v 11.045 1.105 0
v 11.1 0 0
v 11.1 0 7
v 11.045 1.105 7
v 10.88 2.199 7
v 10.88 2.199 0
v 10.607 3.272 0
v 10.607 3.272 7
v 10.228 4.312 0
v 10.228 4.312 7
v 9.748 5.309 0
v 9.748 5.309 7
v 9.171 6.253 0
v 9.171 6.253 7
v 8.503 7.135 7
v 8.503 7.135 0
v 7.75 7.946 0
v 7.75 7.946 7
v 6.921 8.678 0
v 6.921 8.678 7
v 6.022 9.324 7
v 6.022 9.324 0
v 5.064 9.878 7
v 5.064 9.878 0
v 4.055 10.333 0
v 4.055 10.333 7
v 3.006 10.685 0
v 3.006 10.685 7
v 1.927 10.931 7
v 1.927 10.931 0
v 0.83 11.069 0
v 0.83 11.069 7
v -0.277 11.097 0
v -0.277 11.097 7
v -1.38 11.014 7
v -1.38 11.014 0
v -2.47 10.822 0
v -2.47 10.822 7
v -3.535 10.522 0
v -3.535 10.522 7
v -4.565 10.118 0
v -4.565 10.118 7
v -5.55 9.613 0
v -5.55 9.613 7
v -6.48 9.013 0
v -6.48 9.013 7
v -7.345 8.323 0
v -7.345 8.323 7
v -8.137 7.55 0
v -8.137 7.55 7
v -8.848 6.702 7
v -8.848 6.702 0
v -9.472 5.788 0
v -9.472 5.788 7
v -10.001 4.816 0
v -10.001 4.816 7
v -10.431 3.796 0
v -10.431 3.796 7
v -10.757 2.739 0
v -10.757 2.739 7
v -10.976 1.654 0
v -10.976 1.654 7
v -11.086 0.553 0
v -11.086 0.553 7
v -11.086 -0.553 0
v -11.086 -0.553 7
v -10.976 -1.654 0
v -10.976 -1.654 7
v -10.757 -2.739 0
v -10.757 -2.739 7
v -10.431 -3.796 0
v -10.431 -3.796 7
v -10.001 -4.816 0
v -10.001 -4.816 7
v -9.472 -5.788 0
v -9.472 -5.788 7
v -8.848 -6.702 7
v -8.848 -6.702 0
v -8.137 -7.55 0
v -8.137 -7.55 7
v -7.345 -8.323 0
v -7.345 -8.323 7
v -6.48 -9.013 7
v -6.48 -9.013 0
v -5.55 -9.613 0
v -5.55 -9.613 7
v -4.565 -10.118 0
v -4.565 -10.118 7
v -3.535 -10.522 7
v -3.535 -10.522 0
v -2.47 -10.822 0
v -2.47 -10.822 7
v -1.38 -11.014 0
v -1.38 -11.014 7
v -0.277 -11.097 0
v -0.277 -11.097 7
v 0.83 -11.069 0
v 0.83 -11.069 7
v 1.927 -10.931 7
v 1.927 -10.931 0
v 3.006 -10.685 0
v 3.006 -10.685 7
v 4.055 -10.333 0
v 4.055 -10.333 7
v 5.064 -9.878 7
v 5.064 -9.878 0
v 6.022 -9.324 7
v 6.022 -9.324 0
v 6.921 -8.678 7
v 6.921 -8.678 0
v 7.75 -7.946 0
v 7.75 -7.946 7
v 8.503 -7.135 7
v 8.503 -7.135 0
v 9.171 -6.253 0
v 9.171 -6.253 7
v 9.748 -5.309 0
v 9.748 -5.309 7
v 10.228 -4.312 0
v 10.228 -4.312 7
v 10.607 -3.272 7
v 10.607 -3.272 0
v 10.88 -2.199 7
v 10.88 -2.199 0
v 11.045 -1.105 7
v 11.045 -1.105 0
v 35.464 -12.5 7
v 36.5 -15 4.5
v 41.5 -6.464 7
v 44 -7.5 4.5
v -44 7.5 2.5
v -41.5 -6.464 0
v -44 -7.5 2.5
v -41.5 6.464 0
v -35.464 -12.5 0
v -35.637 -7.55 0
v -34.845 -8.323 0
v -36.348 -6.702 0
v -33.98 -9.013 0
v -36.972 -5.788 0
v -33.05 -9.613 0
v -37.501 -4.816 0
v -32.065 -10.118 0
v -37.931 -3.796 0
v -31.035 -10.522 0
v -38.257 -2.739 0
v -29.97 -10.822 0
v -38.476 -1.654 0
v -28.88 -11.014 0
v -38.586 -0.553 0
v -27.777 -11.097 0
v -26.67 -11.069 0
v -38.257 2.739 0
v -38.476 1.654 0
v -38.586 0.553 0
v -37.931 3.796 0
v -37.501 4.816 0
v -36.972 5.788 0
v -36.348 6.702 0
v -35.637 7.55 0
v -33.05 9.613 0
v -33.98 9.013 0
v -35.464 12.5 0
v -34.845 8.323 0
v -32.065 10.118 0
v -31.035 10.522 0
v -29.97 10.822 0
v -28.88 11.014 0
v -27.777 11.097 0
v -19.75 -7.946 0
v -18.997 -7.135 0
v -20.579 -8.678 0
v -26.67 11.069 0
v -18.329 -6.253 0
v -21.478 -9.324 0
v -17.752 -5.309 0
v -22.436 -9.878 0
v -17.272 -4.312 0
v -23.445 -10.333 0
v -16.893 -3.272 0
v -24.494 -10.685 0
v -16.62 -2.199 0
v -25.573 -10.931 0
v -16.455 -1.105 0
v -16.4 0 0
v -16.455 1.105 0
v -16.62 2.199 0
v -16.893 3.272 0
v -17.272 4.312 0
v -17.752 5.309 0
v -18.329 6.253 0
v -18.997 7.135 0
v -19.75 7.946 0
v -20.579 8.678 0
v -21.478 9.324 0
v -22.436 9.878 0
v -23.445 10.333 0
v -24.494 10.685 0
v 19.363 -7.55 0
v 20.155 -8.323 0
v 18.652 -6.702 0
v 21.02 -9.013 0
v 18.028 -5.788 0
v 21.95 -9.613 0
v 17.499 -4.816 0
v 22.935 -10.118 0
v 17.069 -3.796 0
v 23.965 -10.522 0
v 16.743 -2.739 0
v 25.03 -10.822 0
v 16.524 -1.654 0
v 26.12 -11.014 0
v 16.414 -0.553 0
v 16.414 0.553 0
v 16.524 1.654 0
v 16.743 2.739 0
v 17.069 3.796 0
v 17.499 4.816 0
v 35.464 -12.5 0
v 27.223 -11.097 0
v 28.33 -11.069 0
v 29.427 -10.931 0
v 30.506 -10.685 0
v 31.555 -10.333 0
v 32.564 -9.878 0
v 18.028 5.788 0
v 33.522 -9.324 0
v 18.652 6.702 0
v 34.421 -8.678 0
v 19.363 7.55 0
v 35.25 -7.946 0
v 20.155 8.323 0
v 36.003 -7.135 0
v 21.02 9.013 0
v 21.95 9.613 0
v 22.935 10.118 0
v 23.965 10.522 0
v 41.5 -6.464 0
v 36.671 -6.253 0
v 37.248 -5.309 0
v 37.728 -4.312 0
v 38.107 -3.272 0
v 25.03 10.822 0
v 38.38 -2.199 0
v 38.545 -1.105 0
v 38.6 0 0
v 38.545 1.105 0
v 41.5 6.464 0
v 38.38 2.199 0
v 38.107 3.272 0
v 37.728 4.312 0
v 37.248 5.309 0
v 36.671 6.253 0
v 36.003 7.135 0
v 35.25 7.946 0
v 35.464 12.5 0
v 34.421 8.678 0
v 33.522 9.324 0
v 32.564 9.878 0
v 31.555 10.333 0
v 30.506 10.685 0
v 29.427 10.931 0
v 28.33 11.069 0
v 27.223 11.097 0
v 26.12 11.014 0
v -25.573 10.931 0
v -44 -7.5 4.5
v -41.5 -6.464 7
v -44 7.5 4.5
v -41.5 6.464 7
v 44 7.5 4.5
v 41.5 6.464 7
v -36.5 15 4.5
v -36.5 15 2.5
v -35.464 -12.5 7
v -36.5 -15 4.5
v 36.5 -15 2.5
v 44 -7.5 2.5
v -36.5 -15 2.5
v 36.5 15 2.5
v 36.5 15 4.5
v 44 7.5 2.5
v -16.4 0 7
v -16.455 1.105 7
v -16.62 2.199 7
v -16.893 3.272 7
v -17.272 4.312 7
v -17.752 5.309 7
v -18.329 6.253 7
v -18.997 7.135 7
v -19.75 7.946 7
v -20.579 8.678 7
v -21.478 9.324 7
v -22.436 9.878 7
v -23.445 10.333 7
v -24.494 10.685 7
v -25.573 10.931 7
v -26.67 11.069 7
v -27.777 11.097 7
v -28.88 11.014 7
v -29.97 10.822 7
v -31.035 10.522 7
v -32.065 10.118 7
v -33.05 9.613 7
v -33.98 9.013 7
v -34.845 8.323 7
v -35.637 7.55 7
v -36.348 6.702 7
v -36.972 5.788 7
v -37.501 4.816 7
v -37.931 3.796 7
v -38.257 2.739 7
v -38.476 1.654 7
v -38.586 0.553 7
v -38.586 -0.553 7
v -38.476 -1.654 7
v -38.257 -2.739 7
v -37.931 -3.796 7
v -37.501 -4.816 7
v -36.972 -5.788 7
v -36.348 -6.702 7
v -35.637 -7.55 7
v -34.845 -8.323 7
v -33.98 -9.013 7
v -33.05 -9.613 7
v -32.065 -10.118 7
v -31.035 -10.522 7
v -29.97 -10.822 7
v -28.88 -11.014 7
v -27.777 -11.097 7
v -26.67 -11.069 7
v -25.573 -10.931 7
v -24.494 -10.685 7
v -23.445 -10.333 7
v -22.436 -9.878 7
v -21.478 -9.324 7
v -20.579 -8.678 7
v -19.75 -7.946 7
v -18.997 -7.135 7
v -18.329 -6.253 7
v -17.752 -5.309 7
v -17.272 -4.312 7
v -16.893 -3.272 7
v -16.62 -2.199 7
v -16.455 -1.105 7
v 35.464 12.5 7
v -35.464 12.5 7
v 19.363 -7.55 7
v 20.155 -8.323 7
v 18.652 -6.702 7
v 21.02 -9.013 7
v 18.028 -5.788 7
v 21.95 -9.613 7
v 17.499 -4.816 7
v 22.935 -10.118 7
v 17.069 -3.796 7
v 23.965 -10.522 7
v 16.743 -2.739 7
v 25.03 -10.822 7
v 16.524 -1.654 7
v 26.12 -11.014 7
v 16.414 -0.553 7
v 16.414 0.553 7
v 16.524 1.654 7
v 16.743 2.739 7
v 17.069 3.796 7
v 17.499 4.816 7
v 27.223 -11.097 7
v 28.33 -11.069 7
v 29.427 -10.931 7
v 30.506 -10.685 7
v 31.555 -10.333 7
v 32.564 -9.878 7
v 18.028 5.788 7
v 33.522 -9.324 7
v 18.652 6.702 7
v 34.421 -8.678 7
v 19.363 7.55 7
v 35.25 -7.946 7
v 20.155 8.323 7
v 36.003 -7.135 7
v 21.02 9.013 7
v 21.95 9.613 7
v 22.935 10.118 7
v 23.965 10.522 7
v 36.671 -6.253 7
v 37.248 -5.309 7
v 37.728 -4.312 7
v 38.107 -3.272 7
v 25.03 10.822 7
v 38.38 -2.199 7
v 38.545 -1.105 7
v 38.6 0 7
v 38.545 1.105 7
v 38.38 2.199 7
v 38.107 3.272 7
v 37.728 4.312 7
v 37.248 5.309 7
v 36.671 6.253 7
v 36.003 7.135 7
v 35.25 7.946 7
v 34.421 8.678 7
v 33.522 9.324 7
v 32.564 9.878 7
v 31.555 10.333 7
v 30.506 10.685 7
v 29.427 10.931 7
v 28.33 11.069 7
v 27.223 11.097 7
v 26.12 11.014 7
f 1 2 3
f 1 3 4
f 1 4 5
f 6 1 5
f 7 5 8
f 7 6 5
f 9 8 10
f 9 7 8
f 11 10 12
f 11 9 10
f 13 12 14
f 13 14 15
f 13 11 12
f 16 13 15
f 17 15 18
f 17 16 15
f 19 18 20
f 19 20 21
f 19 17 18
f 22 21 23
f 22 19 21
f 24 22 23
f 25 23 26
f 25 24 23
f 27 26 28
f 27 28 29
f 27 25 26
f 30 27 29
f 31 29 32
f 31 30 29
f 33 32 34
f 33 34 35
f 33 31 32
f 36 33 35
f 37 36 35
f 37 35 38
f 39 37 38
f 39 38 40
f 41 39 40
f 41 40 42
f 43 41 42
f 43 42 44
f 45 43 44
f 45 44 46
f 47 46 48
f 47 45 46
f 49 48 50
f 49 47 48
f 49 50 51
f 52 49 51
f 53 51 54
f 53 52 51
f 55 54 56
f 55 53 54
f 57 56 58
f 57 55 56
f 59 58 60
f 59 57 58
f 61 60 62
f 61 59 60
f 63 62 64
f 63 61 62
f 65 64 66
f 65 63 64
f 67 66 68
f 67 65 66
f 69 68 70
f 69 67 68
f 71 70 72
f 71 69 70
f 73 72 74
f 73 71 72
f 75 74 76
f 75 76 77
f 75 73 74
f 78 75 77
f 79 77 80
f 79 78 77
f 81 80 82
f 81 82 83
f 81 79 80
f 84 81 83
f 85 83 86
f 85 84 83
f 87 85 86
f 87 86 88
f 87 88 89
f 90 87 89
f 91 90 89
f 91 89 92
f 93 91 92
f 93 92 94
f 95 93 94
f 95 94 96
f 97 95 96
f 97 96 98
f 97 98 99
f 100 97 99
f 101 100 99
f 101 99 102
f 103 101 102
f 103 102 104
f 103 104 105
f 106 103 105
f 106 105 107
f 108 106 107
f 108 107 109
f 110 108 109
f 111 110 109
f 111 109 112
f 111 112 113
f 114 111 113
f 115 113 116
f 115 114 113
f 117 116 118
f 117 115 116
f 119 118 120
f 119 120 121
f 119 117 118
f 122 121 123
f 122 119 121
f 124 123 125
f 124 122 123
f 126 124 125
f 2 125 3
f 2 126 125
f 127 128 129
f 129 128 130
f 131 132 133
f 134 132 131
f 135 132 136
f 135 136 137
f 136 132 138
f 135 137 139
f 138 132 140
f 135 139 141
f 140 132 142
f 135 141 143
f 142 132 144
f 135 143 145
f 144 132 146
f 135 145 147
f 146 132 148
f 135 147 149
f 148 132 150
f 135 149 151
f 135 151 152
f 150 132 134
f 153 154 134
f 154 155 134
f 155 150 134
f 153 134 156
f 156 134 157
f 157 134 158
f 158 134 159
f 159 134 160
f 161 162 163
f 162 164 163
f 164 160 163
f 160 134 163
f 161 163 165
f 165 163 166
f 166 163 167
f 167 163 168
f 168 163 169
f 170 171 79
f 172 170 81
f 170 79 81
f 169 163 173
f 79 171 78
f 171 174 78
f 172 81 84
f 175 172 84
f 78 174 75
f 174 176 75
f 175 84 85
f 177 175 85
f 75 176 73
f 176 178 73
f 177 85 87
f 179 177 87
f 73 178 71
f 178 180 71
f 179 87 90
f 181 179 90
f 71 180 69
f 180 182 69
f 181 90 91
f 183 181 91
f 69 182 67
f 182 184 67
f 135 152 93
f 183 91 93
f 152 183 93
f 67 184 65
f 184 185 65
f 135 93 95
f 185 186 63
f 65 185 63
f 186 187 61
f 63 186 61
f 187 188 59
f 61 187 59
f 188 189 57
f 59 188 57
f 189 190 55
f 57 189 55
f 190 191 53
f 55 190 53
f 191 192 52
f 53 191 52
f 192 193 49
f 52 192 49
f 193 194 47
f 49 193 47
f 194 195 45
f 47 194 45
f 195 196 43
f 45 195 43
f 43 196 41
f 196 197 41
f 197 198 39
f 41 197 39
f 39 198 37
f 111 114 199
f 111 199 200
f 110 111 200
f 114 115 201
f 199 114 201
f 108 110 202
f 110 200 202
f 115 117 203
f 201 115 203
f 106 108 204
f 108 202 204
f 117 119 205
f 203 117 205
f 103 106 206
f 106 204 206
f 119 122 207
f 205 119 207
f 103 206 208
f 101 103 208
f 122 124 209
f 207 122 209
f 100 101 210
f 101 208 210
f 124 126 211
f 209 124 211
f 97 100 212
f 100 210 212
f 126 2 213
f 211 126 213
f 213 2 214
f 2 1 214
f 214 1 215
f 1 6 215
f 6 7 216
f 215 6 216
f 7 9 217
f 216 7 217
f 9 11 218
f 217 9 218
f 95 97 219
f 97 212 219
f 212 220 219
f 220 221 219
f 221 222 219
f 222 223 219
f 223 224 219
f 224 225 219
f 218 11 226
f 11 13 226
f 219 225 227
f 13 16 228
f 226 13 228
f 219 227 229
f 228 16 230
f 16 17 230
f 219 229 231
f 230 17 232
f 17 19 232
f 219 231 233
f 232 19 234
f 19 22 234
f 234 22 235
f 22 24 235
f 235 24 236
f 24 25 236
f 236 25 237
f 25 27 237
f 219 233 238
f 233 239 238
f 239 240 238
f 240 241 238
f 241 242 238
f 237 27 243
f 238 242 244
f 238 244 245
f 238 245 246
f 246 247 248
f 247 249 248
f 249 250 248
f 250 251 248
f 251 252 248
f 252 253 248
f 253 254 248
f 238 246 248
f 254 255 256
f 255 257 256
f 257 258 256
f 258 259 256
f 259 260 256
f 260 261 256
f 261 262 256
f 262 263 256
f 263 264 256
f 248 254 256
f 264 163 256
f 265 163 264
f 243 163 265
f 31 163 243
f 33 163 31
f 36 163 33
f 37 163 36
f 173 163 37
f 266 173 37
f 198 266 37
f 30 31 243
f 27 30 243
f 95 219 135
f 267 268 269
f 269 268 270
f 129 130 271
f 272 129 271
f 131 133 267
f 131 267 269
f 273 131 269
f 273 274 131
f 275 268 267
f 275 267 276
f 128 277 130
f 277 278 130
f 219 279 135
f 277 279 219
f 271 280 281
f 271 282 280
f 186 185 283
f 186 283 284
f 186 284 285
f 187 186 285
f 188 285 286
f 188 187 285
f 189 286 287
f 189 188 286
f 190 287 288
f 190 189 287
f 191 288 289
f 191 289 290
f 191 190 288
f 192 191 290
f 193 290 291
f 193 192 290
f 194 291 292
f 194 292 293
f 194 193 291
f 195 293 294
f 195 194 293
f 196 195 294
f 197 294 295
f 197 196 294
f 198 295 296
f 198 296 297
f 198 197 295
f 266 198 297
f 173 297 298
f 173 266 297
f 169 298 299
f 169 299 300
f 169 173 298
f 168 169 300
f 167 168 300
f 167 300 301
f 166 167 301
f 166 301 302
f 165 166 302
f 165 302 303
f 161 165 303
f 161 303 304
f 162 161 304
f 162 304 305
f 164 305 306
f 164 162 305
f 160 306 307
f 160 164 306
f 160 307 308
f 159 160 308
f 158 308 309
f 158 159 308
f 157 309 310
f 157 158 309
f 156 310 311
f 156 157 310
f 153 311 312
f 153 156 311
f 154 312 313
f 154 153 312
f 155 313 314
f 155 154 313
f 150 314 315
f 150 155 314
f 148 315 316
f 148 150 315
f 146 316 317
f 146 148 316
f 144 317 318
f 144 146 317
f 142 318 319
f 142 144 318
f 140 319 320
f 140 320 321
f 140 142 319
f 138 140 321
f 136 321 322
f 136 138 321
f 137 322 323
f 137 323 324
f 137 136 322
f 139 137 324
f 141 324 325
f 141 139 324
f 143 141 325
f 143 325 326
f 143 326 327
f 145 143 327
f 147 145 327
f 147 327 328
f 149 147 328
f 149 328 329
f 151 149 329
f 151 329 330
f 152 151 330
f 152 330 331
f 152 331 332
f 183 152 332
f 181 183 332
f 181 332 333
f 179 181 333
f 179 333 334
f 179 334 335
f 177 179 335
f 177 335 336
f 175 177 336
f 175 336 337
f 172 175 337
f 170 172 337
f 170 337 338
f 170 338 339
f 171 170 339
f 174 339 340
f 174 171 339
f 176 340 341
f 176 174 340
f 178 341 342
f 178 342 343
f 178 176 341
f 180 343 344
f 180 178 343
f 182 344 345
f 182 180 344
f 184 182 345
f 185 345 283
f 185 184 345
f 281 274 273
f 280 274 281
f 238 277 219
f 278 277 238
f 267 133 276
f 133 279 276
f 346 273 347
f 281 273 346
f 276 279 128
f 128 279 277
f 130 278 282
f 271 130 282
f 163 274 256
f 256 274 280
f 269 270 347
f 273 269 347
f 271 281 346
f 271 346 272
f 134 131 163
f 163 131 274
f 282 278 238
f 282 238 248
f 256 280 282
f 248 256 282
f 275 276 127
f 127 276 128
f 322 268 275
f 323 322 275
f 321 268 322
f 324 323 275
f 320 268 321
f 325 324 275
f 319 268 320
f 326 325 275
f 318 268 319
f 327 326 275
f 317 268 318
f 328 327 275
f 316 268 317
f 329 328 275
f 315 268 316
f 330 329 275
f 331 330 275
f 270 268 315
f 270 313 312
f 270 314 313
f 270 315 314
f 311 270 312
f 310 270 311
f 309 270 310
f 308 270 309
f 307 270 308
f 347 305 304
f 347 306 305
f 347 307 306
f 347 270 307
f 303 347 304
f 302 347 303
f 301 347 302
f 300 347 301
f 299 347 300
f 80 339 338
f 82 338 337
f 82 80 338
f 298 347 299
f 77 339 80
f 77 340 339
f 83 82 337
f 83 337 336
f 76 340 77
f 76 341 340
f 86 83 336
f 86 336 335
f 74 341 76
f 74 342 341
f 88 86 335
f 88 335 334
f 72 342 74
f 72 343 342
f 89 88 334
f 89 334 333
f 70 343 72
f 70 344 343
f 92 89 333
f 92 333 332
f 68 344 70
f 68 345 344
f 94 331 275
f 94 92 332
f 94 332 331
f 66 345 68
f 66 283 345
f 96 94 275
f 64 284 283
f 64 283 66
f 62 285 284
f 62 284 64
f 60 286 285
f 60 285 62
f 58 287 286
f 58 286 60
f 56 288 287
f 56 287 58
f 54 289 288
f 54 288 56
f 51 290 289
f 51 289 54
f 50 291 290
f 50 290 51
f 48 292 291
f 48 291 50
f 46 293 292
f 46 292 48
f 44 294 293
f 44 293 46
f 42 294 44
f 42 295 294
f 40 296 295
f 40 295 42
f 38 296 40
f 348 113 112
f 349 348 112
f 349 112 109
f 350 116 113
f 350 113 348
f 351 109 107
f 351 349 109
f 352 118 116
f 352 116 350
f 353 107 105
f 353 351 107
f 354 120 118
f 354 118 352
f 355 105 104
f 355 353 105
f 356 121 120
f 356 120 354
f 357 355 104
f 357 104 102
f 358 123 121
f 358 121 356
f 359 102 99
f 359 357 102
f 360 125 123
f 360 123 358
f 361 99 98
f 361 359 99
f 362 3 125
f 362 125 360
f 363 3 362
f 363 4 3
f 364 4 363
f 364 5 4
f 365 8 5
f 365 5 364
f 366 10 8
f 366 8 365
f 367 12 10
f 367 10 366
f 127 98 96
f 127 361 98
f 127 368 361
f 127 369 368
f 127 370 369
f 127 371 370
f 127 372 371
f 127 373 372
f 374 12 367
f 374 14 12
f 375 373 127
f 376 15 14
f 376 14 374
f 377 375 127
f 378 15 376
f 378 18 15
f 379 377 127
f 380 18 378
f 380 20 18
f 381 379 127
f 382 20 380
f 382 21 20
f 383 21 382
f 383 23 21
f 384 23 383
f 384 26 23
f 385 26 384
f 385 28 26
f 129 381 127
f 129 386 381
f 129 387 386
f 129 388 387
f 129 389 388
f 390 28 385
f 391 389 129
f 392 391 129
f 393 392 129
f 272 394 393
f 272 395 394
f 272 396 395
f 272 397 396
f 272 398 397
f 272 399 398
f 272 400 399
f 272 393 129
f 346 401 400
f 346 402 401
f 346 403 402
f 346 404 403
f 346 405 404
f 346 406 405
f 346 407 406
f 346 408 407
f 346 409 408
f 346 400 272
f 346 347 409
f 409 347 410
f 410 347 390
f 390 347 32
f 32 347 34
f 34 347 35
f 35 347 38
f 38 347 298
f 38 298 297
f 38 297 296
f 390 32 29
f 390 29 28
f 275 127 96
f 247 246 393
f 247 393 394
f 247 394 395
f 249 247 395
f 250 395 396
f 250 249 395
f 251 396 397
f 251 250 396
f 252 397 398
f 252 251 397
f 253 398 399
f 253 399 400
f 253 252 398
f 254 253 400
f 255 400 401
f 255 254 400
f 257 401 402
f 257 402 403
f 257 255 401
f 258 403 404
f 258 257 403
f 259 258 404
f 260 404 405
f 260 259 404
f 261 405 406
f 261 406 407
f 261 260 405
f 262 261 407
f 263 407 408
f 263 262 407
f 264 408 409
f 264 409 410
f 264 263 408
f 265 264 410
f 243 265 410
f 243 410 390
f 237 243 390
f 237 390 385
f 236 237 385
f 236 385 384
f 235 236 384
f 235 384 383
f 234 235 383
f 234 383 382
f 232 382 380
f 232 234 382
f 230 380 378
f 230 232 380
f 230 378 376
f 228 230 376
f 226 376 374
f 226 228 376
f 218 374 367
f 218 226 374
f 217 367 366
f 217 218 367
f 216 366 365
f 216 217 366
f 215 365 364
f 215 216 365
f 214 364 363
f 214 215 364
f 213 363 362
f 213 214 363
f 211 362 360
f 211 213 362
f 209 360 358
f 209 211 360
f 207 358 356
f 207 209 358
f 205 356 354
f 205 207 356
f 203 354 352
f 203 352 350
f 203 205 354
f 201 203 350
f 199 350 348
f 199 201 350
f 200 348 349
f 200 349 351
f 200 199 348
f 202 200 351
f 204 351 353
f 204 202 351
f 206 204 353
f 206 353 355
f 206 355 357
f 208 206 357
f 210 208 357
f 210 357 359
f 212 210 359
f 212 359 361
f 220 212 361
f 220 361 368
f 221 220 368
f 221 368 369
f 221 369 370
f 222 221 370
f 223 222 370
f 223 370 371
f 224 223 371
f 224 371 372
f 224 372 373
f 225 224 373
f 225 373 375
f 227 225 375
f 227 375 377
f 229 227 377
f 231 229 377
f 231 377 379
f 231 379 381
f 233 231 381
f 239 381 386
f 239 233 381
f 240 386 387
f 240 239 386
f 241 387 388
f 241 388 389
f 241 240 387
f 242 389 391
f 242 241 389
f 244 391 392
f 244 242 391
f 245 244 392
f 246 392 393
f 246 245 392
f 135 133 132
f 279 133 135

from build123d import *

# Parameters (mm, degrees)
F0_W     = 88
F0_H     = 30
F0_R     = 11.1
F1_DEPTH = 7
F2_SIZE  = 7.5
F3_SIZE  = 2.5


with BuildPart() as f1:
    # F0 (on Top) → F1 (new body)
    with BuildSketch(Plane.XY):
        Rectangle(F0_W, F0_H)
        with Locations((-27.5, 0)):
            Circle(F0_R, mode=Mode.SUBTRACT)
        Circle(F0_R, mode=Mode.SUBTRACT)
        with Locations((27.5, 0)):
            Circle(F0_R, mode=Mode.SUBTRACT)
    extrude(amount=F1_DEPTH)

    # F2
    f2_edges = [f1.edges().sort_by_distance(p)[0] for p in [
        (-44, -15, 3.5),
        (-44, 15, 3.5),
        (44, 15, 3.5),
        (44, -15, 3.5),
    ]]
    chamfer(f2_edges, length=F2_SIZE)

    # F3
    f3_edges = [f1.edges().sort_by_distance(p)[0] for p in [
        (0, 15, 7),
        (-40.25, 11.25, 7),
        (-44, 0, 7),
        (-40.25, -11.25, 7),
        (0, -15, 7),
        (40.25, -11.25, 7),
        (44, 0, 7),
        (40.25, 11.25, 7),
        (0, 15, 0),
        (-40.25, 11.25, 0),
        (-44, 0, 0),
        (-40.25, -11.25, 0),
        (0, -15, 0),
        (40.25, -11.25, 0),
        (44, 0, 0),
        (40.25, 11.25, 0),
    ]]
    chamfer(f3_edges, length=F3_SIZE)


solid = f1.part
